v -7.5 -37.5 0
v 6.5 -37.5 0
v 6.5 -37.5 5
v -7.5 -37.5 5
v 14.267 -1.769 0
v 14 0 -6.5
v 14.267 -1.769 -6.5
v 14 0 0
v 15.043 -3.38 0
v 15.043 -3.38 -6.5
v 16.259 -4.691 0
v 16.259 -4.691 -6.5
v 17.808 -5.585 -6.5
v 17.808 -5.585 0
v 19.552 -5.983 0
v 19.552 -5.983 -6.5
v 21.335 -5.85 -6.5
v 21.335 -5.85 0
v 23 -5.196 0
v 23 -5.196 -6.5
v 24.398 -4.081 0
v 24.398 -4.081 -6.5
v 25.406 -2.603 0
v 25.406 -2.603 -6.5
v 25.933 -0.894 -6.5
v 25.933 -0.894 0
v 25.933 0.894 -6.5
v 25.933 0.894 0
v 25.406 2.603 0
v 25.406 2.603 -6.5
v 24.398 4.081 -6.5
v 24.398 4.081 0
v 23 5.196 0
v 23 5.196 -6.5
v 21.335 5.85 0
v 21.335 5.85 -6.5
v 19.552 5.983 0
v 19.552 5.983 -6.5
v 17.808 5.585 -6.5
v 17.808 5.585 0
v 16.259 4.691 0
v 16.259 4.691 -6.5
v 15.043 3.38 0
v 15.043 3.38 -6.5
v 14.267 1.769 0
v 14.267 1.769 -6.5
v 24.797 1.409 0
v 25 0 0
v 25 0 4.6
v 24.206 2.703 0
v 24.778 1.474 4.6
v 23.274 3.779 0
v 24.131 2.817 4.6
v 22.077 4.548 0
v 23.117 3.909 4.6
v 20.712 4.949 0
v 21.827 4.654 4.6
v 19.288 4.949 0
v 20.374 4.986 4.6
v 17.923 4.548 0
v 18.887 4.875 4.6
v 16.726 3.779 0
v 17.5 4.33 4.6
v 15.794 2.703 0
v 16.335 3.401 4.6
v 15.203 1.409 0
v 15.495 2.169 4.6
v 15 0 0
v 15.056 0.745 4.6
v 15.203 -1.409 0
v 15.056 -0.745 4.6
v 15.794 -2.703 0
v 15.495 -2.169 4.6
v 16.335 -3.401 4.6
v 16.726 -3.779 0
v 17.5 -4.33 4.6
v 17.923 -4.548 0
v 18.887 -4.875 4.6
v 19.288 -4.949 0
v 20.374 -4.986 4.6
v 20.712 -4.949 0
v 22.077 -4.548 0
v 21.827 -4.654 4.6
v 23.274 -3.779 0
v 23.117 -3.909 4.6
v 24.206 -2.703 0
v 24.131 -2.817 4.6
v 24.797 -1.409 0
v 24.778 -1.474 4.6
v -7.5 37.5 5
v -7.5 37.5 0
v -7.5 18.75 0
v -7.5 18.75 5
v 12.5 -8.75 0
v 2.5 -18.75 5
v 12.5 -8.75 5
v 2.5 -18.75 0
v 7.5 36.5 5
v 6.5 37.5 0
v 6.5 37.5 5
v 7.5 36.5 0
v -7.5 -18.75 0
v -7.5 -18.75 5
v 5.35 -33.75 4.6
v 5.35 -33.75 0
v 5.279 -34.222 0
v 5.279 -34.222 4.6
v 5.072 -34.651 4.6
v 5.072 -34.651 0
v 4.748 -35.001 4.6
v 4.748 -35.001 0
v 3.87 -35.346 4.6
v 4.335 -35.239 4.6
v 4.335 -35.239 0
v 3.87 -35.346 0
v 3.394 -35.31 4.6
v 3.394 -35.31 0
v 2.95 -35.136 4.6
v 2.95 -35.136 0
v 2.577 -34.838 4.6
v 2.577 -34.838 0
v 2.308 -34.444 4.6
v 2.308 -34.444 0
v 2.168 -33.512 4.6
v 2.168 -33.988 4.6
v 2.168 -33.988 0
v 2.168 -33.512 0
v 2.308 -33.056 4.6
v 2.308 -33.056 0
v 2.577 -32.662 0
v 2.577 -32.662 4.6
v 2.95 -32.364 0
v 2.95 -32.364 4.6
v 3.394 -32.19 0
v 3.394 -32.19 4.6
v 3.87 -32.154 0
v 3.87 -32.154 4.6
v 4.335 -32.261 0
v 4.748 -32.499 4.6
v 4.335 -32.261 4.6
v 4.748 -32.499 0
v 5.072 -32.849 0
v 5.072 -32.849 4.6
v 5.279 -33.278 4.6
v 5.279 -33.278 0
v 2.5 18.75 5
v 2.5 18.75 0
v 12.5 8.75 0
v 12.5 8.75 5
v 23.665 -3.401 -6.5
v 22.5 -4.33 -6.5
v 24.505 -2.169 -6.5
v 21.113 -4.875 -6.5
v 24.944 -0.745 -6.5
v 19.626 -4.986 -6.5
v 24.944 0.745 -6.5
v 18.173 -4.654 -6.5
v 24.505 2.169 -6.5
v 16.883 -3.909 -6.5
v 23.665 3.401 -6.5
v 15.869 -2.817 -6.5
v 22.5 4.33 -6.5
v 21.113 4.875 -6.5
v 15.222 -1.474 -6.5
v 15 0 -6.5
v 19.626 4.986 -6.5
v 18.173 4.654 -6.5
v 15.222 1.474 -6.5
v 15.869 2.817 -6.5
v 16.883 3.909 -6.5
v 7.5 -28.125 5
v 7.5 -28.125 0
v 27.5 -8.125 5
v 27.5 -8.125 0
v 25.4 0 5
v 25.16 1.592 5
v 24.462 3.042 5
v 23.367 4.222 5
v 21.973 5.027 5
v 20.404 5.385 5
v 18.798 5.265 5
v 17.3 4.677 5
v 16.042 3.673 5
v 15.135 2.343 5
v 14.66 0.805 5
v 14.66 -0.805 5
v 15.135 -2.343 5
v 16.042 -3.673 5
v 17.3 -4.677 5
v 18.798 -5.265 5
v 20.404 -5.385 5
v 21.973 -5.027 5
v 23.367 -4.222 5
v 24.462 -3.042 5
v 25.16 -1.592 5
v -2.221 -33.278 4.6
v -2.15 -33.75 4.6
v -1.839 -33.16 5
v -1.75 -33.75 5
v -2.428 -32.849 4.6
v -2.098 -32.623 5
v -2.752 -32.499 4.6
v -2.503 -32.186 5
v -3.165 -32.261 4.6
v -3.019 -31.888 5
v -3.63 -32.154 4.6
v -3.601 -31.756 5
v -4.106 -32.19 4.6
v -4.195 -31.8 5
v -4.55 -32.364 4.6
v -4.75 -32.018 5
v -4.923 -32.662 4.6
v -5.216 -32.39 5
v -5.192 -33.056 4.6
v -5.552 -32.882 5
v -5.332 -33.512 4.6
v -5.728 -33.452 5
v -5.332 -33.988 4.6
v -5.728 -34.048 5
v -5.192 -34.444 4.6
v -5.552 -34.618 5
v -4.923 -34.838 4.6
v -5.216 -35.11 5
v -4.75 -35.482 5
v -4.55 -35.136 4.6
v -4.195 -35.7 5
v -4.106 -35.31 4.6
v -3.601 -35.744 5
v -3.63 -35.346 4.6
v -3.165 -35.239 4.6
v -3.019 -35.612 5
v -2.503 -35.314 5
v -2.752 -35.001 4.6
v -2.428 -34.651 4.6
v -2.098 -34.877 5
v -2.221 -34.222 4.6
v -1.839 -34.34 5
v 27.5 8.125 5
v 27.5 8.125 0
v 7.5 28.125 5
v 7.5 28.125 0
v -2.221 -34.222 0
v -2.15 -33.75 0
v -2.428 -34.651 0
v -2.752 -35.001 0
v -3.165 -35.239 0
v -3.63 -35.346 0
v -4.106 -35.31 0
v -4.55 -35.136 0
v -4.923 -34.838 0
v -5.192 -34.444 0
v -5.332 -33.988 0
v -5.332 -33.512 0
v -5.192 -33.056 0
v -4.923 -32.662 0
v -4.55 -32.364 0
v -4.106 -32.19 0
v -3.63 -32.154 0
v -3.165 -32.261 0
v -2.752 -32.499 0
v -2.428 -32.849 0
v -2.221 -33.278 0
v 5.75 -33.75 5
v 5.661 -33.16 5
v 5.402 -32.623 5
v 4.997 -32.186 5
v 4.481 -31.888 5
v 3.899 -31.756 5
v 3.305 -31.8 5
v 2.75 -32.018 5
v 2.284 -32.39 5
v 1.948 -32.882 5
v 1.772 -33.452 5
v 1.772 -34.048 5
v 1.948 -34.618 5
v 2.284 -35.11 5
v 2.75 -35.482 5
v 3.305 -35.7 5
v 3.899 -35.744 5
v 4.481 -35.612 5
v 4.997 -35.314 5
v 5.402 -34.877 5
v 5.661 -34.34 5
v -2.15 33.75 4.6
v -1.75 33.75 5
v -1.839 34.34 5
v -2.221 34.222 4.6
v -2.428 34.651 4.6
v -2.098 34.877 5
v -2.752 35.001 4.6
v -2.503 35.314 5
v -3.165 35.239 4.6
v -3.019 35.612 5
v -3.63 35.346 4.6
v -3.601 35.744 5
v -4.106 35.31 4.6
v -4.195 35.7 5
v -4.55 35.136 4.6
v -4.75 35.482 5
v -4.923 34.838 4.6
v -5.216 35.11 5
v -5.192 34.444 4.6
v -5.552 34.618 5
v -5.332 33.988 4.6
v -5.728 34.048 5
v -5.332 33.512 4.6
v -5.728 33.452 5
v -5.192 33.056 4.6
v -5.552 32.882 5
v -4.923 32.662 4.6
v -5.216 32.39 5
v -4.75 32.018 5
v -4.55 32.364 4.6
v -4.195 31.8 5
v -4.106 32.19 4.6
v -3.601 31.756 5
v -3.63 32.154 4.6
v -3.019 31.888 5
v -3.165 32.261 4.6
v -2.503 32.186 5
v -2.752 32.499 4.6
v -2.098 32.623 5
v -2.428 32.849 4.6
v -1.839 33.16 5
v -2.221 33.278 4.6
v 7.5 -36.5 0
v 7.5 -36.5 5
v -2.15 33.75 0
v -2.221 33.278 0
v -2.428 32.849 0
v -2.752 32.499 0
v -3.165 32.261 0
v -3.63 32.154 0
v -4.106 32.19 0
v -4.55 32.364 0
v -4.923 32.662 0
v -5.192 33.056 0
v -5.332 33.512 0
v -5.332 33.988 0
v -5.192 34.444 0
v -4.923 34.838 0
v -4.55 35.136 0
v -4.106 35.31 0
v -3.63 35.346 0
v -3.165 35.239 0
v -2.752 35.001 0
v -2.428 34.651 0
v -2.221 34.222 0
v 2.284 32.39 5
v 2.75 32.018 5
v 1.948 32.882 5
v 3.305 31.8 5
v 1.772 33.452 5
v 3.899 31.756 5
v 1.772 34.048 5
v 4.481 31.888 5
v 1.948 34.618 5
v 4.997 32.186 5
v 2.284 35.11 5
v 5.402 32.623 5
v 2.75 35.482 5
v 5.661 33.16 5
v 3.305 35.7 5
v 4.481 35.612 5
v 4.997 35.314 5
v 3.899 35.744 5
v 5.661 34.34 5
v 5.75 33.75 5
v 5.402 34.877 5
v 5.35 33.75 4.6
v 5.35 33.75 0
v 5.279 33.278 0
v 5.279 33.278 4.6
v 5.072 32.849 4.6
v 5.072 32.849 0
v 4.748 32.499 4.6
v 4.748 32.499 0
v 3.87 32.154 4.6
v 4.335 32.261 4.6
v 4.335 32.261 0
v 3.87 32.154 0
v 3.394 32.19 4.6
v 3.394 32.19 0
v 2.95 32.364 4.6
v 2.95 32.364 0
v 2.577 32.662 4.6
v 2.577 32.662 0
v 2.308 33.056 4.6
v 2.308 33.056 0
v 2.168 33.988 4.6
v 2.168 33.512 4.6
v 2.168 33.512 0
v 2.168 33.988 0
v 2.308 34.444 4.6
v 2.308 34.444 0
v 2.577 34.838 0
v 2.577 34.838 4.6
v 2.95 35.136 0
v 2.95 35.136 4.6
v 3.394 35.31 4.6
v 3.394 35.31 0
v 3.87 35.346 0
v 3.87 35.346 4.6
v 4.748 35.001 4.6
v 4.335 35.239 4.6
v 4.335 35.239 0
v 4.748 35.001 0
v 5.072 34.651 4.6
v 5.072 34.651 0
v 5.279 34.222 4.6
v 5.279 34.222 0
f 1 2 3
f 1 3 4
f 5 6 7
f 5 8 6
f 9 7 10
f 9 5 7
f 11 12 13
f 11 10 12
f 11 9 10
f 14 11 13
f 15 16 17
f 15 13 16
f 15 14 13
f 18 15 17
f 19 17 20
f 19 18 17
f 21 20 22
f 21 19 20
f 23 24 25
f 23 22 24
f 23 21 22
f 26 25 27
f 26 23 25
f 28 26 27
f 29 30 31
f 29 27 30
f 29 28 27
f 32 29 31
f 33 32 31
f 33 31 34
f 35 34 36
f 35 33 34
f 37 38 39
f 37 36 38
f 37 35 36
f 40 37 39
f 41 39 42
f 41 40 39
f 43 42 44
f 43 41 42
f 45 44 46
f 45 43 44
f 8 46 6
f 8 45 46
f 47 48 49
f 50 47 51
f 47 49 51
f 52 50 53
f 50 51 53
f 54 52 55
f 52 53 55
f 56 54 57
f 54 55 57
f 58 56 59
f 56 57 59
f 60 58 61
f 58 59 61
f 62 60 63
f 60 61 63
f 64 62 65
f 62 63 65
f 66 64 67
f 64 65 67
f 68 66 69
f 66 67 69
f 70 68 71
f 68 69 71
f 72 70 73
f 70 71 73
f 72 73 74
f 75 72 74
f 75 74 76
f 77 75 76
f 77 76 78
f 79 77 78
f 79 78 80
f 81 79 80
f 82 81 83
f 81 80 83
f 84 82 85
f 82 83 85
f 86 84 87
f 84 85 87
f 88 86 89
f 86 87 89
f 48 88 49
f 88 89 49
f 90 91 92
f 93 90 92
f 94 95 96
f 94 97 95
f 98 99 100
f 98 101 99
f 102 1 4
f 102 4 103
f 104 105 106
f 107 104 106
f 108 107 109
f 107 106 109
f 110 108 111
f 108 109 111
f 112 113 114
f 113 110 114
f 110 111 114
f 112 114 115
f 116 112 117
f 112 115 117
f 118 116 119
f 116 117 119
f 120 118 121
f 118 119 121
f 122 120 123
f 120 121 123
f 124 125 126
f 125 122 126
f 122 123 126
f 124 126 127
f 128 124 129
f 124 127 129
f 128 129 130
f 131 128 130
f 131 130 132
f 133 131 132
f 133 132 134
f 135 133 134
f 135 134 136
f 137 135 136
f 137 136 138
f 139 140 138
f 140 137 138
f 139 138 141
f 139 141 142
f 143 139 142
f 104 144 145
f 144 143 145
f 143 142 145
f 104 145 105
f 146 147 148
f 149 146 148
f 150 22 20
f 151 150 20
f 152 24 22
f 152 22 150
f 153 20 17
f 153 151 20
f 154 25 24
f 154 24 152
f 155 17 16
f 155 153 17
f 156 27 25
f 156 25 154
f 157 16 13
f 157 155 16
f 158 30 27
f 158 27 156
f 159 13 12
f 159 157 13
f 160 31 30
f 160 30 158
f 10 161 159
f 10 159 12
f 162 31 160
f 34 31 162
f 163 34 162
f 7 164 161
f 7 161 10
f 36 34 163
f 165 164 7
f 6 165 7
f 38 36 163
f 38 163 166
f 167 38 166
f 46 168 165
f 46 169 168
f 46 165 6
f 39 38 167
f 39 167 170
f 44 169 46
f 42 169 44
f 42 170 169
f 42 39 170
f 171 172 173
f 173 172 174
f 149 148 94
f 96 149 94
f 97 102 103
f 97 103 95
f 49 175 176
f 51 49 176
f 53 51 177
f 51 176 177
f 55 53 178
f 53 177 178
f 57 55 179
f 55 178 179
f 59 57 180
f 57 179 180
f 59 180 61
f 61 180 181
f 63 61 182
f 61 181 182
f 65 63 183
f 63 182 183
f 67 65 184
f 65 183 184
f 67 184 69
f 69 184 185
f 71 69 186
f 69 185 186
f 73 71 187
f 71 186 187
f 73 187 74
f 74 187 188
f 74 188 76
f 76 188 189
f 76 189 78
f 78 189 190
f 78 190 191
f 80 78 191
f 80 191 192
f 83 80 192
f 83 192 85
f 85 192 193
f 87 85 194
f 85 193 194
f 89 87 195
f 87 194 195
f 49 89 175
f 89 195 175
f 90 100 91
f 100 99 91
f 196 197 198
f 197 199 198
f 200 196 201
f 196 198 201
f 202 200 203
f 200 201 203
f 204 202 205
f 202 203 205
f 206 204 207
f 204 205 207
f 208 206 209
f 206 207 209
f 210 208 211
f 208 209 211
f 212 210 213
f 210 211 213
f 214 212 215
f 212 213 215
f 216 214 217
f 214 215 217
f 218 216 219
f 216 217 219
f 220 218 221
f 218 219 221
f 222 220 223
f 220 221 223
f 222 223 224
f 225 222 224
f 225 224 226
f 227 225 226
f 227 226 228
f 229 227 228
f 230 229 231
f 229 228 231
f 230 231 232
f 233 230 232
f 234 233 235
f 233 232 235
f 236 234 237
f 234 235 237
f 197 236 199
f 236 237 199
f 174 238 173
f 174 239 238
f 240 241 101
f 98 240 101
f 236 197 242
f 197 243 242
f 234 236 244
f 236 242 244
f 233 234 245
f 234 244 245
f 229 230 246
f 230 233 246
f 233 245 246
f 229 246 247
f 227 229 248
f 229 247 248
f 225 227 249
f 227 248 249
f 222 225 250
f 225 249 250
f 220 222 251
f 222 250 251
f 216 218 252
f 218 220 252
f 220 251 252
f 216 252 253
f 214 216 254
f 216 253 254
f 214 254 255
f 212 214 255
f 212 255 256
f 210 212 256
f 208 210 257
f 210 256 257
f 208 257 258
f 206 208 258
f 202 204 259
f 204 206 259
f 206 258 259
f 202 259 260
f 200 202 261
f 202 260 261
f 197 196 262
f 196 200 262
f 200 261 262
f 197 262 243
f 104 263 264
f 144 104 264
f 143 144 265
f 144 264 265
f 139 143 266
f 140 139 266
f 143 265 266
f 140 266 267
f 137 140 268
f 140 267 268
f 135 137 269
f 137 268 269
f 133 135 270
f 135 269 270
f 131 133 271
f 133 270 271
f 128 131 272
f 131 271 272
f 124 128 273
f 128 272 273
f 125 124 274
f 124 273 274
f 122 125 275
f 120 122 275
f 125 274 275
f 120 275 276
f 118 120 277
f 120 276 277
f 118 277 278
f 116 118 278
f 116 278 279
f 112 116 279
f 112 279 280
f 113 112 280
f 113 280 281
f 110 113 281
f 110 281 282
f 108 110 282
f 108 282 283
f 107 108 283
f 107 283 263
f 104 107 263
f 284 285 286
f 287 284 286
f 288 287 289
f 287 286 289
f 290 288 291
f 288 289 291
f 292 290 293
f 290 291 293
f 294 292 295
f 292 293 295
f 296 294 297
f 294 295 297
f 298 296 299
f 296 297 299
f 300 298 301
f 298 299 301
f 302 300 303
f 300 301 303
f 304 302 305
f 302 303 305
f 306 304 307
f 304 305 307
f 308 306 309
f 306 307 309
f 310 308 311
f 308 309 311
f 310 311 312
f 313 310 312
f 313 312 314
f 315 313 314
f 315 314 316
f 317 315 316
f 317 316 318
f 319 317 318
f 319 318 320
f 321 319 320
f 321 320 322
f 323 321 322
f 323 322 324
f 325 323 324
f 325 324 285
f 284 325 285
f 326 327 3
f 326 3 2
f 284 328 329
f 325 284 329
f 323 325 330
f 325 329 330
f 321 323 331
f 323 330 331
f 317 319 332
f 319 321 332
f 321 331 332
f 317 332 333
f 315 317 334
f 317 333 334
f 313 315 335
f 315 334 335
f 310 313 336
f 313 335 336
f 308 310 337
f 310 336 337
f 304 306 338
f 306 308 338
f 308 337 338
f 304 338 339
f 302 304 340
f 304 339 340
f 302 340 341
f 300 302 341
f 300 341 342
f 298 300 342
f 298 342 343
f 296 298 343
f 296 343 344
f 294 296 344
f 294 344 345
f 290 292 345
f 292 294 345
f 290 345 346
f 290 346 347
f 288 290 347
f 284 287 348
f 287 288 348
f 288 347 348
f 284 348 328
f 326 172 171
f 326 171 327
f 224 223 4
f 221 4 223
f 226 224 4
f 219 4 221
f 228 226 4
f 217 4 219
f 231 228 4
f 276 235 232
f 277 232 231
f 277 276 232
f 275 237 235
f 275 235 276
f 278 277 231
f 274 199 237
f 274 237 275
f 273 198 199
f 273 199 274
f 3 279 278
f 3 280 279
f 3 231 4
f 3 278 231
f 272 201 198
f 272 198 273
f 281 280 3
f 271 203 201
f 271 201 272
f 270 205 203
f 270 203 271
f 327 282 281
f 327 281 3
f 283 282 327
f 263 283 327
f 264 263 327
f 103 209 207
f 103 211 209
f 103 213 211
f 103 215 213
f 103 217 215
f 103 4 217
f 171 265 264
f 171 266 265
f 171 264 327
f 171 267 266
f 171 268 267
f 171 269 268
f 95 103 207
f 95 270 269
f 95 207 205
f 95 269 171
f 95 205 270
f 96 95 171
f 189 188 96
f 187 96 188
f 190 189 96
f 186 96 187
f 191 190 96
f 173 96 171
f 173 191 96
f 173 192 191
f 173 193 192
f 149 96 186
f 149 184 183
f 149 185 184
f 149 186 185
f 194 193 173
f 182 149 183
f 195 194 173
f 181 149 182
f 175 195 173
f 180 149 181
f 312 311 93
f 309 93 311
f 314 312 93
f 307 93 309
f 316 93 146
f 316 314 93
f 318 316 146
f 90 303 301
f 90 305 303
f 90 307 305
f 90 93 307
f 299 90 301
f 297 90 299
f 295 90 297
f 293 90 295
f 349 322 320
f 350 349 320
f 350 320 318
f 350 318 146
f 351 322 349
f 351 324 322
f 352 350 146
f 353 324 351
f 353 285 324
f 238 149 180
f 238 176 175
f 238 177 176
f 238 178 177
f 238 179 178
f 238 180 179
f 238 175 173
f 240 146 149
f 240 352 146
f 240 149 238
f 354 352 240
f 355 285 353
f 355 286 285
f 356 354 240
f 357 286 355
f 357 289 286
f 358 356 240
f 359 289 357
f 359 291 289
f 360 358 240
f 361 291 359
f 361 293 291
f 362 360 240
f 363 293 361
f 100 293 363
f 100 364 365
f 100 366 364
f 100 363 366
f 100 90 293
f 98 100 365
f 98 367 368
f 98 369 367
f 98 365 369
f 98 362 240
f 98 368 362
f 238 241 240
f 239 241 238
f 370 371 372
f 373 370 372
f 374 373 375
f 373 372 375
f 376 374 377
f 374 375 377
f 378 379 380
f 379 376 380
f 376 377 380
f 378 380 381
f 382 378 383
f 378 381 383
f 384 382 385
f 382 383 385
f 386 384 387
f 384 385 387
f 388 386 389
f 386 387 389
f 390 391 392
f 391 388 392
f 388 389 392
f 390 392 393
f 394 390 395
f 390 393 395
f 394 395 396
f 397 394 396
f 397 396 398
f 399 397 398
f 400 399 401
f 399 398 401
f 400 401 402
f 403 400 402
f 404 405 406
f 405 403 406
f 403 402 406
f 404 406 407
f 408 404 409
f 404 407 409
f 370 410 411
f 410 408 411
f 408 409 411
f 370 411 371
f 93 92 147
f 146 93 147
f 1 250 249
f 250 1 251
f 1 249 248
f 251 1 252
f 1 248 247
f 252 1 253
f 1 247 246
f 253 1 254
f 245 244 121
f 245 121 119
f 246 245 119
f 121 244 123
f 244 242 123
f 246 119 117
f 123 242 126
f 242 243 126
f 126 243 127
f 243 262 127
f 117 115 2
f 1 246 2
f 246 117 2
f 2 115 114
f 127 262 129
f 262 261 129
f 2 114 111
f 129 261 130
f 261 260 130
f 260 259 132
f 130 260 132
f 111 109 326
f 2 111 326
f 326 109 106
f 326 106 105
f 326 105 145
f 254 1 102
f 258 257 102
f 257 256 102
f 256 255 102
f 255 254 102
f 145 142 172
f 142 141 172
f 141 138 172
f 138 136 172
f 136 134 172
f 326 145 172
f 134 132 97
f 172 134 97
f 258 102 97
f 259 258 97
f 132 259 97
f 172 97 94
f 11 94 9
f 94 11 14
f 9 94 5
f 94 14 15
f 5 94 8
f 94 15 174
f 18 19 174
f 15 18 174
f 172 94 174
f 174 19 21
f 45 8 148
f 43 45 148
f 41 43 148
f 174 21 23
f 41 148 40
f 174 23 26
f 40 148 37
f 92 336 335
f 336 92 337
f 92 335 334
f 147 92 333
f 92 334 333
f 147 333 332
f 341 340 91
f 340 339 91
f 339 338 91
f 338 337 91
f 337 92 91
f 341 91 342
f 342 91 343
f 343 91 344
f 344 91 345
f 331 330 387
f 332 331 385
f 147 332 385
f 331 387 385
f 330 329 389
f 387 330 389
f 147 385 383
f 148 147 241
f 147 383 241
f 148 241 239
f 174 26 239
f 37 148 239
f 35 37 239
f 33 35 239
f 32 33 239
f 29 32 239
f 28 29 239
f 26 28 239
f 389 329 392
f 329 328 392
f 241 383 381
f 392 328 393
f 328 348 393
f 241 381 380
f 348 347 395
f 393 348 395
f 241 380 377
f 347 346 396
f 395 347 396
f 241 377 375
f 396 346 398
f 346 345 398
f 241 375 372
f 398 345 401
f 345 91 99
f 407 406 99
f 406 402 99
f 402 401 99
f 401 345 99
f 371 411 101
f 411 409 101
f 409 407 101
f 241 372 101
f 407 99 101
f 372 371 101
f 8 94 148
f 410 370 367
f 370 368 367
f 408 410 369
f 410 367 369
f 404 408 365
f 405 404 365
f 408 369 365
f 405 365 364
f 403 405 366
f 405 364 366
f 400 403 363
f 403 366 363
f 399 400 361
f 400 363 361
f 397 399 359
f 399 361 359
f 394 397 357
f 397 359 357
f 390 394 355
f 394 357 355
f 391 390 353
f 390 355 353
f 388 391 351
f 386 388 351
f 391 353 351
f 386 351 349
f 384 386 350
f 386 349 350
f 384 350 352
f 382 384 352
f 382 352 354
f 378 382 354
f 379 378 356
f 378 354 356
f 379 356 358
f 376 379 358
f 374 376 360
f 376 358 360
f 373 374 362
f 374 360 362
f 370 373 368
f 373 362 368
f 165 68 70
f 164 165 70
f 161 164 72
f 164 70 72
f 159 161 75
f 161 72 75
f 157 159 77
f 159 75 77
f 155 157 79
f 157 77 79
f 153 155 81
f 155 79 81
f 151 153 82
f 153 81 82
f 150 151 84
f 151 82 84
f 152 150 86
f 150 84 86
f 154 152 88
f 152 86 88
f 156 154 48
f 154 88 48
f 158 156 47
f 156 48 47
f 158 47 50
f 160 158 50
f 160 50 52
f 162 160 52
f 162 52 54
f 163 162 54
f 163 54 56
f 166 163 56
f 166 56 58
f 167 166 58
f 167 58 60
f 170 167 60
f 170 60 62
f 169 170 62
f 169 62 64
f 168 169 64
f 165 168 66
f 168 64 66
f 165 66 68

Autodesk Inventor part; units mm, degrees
ref_plane "YZ Plane" through (0, 0, 0) normal (1, 0, 0) x (0, 1, 0)
ref_plane "XZ Plane" through (0, 0, 0) normal (0, 1, 0) x (-1, 0, 0)
sketch "Sketch1" plane through (0, 0, 0) normal (0, 0, 1) x (1, 0, 0)
  line L0 (-5.8474, 0) -> (5.8474, 0) construction
  line L1 (2.5, 18.75) -> (7.5, 18.75)
  line L2 (7.5, 18.75) -> (7.5, 37.5)
  line L3 (7.5, 37.5) -> (-7.5, 37.5)
  line L4 (-7.5, 37.5) -> (-7.5, 18.75)
  line L5 (-7.5, 18.75) -> (2.5, 18.75)
  circle A0 centre (3.75, 33.75) radius 1.6
  circle A1 centre (-3.75, 33.75) radius 1.6
  line L6 (2.5, -18.75) -> (7.5, -18.75)
  line L7 (7.5, -18.75) -> (7.5, -37.5)
  line L8 (7.5, -37.5) -> (-7.5, -37.5)
  line L9 (-7.5, -37.5) -> (-7.5, -18.75)
  line L10 (-7.5, -18.75) -> (2.5, -18.75)
  circle A2 centre (3.75, -33.75) radius 1.6
  circle A3 centre (-3.75, -33.75) radius 1.6
  line L11 (7.5, 28.125) -> (27.5, 8.125)
  line L12 (7.5, 28.125) -> (35.7843, 28.125) construction
  line L13 (2.5, 18.75) -> (12.5, 8.75)
  line L14 (12.5, 8.75) -> (12.5, 0)
  line L15 (27.5, 8.125) -> (27.5, 0)
  line L16 (7.5, -28.125) -> (27.5, -8.125)
  line L17 (2.5, -18.75) -> (12.5, -8.75)
  line L18 (12.5, -8.75) -> (12.5, 0)
  line L19 (27.5, -8.125) -> (27.5, 0)
  point P0 (0, 0)
  point P1 (0, 0)
  point P2 (2.5, -18.75)
  point P3 (2.5, -18.75)
  point P4 (2.5, 18.75)
  dimension "d2" = 15
  dimension "d3" = 18.75
  dimension "d4" = 7.5
  dimension "d5" = 3.2
  dimension "d6" = 3.2
  dimension "d7" = 3.75
  dimension "d8" = 3.75
  dimension "d9" = 7.5
  dimension "d10" = 18.75
  dimension "d20" = 45
  dimension "d21" = 20
  dimension "d31" = 20
  dimension "d32" = 10
ref_plane "Work Plane1" through (0, 0, 5) normal (0, 0, 1) x (1, 0, 0)
extrude "Extrusion3" add sketch "Sketch1" along normal blind 5
chamfer "Chamfer4" distance 0.4 angle 45 4 edges at (2.15, 33.75, 5) (-5.35, 33.75, 5) (2.15, -33.75, 5) (-5.35, -33.75, 5)
sketch "Sketch4" plane through (0, 0, 5) normal (0, 0, 1) x (1, 0, 0)
  circle A0 centre (20, 0) radius 5
  line L0 (27.5, -8.125) -> (27.5, 8.125) projected
  line L1 (12.5, 8.75) -> (12.5, -8.75) projected
  point P0 (0, 0)
  point P1 (12.5, 0)
  dimension "d40" = 10
  dimension "d41" = 15
  dimension "d42" = 7.5
extrude "Extrusion5" cut sketch "Sketch4" against normal blind 5
chamfer "Chamfer5" distance 0.4 angle 45 1 edges at (15, 0, 5)
sketch "Sketch5" plane through (0, 0, 0) normal (0, 0, -1) x (-1, 0, 0)
  circle A0 centre (-20, 0) radius 5 projected
  circle A1 centre (-20, 0) radius 5
  circle A2 centre (-20, 0) radius 6
  point P0 (0, 0)
  dimension "d48" = 12
extrude "Extrusion6" add sketch "Sketch5" along normal blind 6.5
chamfer "Chamfer6" distance 1 angle 45 2 edges at (7.5, 37.5, 2.5) (7.5, -37.5, 2.5)
equation "\"d4\" = 0.5 * d2"
equation "\"d7\" = 0.25 * d2"
equation "\"d8\" = d7"
equation "\"d9\" = 0.5 * d2"
equation "\"d31\" = d21"
equation "\"d42\" = 0.5 * d41"
properties part number "uchwyt-GM" material "Stainless Steel"
